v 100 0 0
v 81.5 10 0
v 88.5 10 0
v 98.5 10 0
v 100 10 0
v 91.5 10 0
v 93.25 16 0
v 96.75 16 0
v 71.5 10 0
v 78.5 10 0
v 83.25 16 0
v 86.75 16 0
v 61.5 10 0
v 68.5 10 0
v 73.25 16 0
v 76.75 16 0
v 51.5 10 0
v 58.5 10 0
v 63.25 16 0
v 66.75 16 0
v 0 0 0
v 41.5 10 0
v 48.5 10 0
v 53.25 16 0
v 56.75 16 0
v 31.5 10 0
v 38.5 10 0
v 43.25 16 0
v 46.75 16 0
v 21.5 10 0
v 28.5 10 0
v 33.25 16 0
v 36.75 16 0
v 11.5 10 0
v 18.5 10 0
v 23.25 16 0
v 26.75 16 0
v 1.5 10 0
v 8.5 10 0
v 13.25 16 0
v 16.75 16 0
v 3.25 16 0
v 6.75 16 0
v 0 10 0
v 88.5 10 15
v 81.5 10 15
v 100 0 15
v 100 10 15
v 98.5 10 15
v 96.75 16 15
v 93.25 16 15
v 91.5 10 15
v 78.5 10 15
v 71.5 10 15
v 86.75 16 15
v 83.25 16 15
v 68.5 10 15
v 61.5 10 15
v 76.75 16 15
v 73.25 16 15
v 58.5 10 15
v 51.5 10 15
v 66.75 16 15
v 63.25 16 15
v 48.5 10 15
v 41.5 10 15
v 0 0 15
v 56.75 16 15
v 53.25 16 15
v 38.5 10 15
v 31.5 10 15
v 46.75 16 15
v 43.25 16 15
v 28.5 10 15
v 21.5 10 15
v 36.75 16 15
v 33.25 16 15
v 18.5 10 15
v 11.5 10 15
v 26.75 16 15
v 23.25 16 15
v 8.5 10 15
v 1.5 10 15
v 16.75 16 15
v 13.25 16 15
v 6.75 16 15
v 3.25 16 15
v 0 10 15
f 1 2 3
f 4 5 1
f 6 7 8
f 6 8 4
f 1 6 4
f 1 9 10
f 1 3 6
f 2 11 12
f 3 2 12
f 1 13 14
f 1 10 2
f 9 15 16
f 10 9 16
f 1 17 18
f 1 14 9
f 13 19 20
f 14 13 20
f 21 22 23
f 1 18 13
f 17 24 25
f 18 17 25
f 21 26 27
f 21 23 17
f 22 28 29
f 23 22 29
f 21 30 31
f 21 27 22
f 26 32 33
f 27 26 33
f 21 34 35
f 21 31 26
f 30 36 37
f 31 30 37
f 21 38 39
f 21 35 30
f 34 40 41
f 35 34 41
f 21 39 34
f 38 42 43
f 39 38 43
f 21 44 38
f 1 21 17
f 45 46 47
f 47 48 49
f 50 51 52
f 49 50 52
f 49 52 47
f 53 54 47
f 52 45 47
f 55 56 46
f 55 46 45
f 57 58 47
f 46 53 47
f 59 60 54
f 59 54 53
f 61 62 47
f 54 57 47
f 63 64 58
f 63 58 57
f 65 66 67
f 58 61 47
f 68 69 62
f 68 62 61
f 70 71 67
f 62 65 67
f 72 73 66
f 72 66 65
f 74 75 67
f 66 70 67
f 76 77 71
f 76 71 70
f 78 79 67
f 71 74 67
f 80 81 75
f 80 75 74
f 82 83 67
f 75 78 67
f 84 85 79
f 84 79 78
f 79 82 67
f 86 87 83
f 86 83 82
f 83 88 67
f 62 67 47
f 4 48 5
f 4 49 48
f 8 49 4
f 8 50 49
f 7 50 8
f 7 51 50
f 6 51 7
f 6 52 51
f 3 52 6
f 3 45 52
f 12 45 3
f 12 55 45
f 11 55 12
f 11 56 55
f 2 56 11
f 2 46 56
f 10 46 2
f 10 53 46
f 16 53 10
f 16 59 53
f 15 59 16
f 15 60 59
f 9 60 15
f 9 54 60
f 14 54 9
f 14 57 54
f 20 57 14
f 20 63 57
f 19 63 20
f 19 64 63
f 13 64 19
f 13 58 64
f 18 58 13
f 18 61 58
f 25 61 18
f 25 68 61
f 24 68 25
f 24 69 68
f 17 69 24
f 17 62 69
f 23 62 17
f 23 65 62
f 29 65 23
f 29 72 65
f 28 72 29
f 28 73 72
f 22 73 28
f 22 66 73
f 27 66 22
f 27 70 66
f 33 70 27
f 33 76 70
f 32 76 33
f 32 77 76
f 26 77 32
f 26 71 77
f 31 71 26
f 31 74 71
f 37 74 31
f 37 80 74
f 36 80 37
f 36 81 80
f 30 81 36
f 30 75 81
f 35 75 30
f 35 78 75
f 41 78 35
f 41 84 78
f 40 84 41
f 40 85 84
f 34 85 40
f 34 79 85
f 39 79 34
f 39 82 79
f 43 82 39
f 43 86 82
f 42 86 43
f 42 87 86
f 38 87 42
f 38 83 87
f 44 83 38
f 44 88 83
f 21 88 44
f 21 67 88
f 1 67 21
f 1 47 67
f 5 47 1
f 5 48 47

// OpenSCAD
$fn = 32;

// ----------------------------------------------------------------------
// Gear rack: 10 teeth, pitch 10 mm
// ----------------------------------------------------------------------

// --- parameters (mm) ---
teeth = 10;               // number of teeth
pitch = 10;               // tooth pitch, X
root_w = 7;               // tooth width at the root
tip_w = 3.5;              // tooth width at the tip
base_h = 10;              // rack body height, Y
tooth_h = 6;              // tooth height above the body
plate_t = 15;             // rack width, Z (extrusion height)

rack_l = teeth * pitch;  // overall length
total_h = base_h + tooth_h;  // overall height

profile = [[0, 0], [100, 0], [100, 10], [98.5, 10], [96.75, 16], [93.25, 16], [91.5, 10], [88.5, 10], [86.75, 16], [83.25, 16], [81.5, 10], [78.5, 10], [76.75, 16], [73.25, 16], [71.5, 10], [68.5, 10], [66.75, 16], [63.25, 16], [61.5, 10], [58.5, 10], [56.75, 16], [53.25, 16], [51.5, 10], [48.5, 10], [46.75, 16], [43.25, 16], [41.5, 10], [38.5, 10], [36.75, 16], [33.25, 16], [31.5, 10], [28.5, 10], [26.75, 16], [23.25, 16], [21.5, 10], [18.5, 10], [16.75, 16], [13.25, 16], [11.5, 10], [8.5, 10], [6.75, 16], [3.25, 16], [1.5, 10], [0, 10]];  // primary outline, 44 points, counter clockwise

// --- the one profile operation ---
linear_extrude(height = plate_t) polygon(points = profile);
